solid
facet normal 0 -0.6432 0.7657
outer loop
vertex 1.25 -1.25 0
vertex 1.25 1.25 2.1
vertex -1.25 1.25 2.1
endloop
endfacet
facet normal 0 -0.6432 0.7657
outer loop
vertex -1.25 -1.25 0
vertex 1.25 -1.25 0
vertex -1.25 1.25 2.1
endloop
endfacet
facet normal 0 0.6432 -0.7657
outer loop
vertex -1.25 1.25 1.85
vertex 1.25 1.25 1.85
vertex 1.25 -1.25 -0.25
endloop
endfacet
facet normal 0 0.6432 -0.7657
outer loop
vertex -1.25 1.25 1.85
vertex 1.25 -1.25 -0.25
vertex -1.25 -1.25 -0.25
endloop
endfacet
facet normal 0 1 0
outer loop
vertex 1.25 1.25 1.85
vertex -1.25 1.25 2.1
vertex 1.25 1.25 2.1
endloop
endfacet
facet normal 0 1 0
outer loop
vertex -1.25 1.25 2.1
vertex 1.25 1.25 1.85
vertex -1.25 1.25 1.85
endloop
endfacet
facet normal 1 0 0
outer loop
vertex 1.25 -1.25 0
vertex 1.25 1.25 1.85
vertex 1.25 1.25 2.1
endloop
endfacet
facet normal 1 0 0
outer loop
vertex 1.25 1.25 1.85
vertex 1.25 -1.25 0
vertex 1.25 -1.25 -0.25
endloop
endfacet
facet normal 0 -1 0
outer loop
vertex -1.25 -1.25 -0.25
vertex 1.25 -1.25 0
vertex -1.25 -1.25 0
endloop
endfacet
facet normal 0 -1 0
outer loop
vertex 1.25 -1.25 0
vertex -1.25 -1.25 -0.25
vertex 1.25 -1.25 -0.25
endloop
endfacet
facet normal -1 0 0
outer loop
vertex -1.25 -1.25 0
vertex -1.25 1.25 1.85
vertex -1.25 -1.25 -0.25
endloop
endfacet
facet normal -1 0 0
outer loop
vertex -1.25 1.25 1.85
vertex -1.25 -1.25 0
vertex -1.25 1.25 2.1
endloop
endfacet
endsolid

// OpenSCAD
// file: lib/lodge_kit.scad
// Lodge shell tile kit — shared dimensions and modules.
//
// The game paints a lodge footprint in 5 m cells and resolves the
// exterior from these tiles at half-cell (2.5 m) resolution; see
// internal/world/lodge_shell.go. Every tile is authored in the same
// canonical frame:
//
//   * origin on the lodge floor plane (Z = 0);
//   * wall-type tiles sit on a footprint edge, centred on it, with the
//     OUTSIDE toward SCAD −Y (game +Z) and the wall thickness toward +Y;
//   * roof tiles are centred on a half-cell, with Z = 0 at the tile's
//     lowest corner; slopes fall toward −Y (game +Z);
//   * corner tiles sit on a grid vertex; an outer corner's building is
//     in the SCAD (−X, +Y) quadrant, an inner corner's notch in (+X, −Y).
//
// Colours are near-neutral: the renderer tints walls and roofs per lodge
// from a seeded palette (world.ShellPalette).
//
// Keep these in sync with the constants in lodge_shell.go.

tile   = 2.5;   // ShellTileSize
wall_h = 5.0;   // ShellWallHeight
rise   = 2.1;   // ShellRoofRise, per tile of run
pitch  = rise / tile;

wall_t   = 0.35;  // wall thickness
sink     = 1.5;   // walls run this far below the floor to hide pad grading
roof_t   = 0.25;  // roof slab thickness
overhang = 0.7;   // eaves overhang past the wall plane

c_wall   = [0.92, 0.90, 0.86];
c_stone  = [0.62, 0.61, 0.60];
c_trim   = [0.97, 0.97, 0.95];
c_glass  = [0.30, 0.42, 0.52];
c_door   = [0.36, 0.25, 0.18];
c_roof   = [0.97, 0.97, 0.97];
c_fascia = [0.55, 0.52, 0.50];

// Plain wall panel: timber above a stone plinth, a trim band under the
// eaves.
module wall_panel() {
    color(c_wall)
        translate([-tile/2, 0, -sink]) cube([tile, wall_t, wall_h + sink]);
    color(c_stone)
        translate([-tile/2, -0.06, -sink]) cube([tile, wall_t, sink + 0.7]);
    color(c_trim)
        translate([-tile/2, -0.04, wall_h - 0.3]) cube([tile, 0.1, 0.3]);
    battens();
}

// Horizontal board lines above the plinth.
module battens() {
    color(c_wall * 0.8)
        for (z = [1.3 : 0.6 : wall_h - 0.6])
            translate([-tile/2, -0.03, z]) cube([tile, 0.04, 0.06]);
}

// A framed pane on the outer face. x0/w along the wall, z0/h up it.
module pane(x0, w, z0, h) {
    color(c_trim)
        translate([x0 - 0.1, -0.05, z0 - 0.1]) cube([w + 0.2, 0.06, h + 0.2]);
    color(c_glass)
        translate([x0, -0.08, z0]) cube([w, 0.06, h]);
}

module wall_window() {
    wall_panel();
    pane(-0.7, 1.4, 1.4, 2.2);
    color(c_trim) translate([-0.02, -0.1, 1.4]) cube([0.04, 0.04, 2.2]); // mullion
}

// Tall window flanked by shutters.
module wall_window_alt() {
    wall_panel();
    pane(-0.5, 1.0, 1.2, 2.8);
    color(c_door) {
        translate([-1.0, -0.1, 1.2]) cube([0.4, 0.05, 2.8]);
        translate([ 0.6, -0.1, 1.2]) cube([0.4, 0.05, 2.8]);
    }
}

// Floor-to-eave glazing for food courts: a low stone sill, then glass in
// three lights.
module wall_glazed() {
    color(c_wall)
        translate([-tile/2, 0, -sink]) cube([tile, wall_t, wall_h + sink]);
    color(c_stone)
        translate([-tile/2, -0.06, -sink]) cube([tile, wall_t, sink + 0.35]);
    color(c_glass)
        translate([-tile/2, -0.09, 0.35]) cube([tile, 0.06, wall_h - 0.75]);
    color(c_trim) {
        for (x = [-tile/2, -tile/6, tile/6, tile/2 - 0.08])
            translate([x, -0.12, 0.35]) cube([0.08, 0.06, wall_h - 0.75]);
        translate([-tile/2, -0.12, wall_h - 0.45]) cube([tile, 0.07, 0.1]);
    }
}

// Glazed entry door under a small canopy, with a step.
module door() {
    color(c_wall)
        translate([-tile/2, 0, -sink]) cube([tile, wall_t, wall_h + sink]);
    color(c_stone)
        translate([-tile/2, -0.06, -sink]) cube([tile, wall_t, sink + 0.15]);
    battens();
    color(c_door)
        translate([-0.9, -0.1, 0]) cube([1.8, 0.1, 2.7]);
    color(c_glass) {
        translate([-0.75, -0.13, 0.9]) cube([0.65, 0.05, 1.6]);
        translate([ 0.10, -0.13, 0.9]) cube([0.65, 0.05, 1.6]);
    }
    color(c_trim)
        translate([-tile/2, -0.04, wall_h - 0.3]) cube([tile, 0.1, 0.3]);
    color(c_roof)   // canopy
        translate([-1.2, -1.3, 3.0])
            rotate([-12, 0, 0]) cube([2.4, 1.3, 0.12]);
    color(c_stone)  // step
        translate([-1.1, -0.9, -0.3]) cube([2.2, 0.9, 0.42]);
}

module corner_outer() {
    color(c_stone)
        translate([-0.3, -0.05, -sink]) cube([0.35, 0.35, wall_h + sink - 0.3]);
}

module corner_inner() {
    color(c_trim)
        translate([0, -0.12, 0]) cube([0.12, 0.12, wall_h - 0.3]);
}

// Roof slab over one half-cell. h lists corner heights (in rise units)
// in SCAD order (−X,+Y), (+X,+Y), (+X,−Y), (−X,−Y); split names which
// diagonal the top surface folds along: 0 through corners 0–2, 1
// through corners 1–3.
module roof_tile(h, split) {
    p = [[-tile/2, tile/2], [tile/2, tile/2], [tile/2, -tile/2], [-tile/2, -tile/2]];
    top = [for (i = [0:3]) [p[i][0], p[i][1], h[i] * rise]];
    bot = [for (i = [0:3]) [p[i][0], p[i][1], h[i] * rise - roof_t]];
    tris = split == 0 ? [[0, 1, 2], [0, 2, 3]] : [[0, 1, 3], [1, 2, 3]];
    color(c_roof)
        polyhedron(
            points = concat(top, bot),
            faces = concat(
                // top (clockwise seen from above = outward in OpenSCAD)
                [for (t = tris) [t[0], t[1], t[2]]],
                [for (t = tris) [t[2] + 4, t[1] + 4, t[0] + 4]],
                [for (i = [0:3]) [i, i + 4, (i + 1) % 4 + 4, (i + 1) % 4]]
            ));
}

// Eaves strip past a wall edge: continues the roof plane outward and
// down, finished with a fascia board.
module eave() {
    drop = overhang * pitch;
    color(c_roof)
        polyhedron(
            points = [
                [-tile/2, 0, 0], [tile/2, 0, 0], [tile/2, -overhang, -drop], [-tile/2, -overhang, -drop],
                [-tile/2, 0, -roof_t], [tile/2, 0, -roof_t], [tile/2, -overhang, -drop - roof_t], [-tile/2, -overhang, -drop - roof_t],
            ],
            faces = [[0, 1, 2, 3], [7, 6, 5, 4], [0, 4, 5, 1], [1, 5, 6, 2], [2, 6, 7, 3], [3, 7, 4, 0]]);
    color(c_fascia)
        translate([-tile/2, -overhang - 0.05, -drop - roof_t - 0.1]) cube([tile, 0.08, roof_t + 0.2]);
}

// Eaves in the square past an outer corner: a hip folding along the
// diagonal away from the building.
module eave_corner() {
    o = overhang;
    d = o * pitch;
    color(c_roof)
        polyhedron(
            points = [
                [0, 0, 0], [o, 0, -d], [o, -o, -d], [0, -o, -d],
                [0, 0, -roof_t], [o, 0, -d - roof_t], [o, -o, -d - roof_t], [0, -o, -d - roof_t],
            ],
            faces = [[0, 1, 2], [0, 2, 3], [6, 5, 4], [7, 6, 4], [0, 4, 5, 1], [1, 5, 6, 2], [2, 6, 7, 3], [3, 7, 4, 0]]);
    color(c_fascia) {
        translate([0, -o - 0.05, -d - roof_t - 0.1]) cube([o + 0.05, 0.08, roof_t + 0.2]);
        translate([o - 0.03, -o - 0.05, -d - roof_t - 0.1]) cube([0.08, o + 0.05, roof_t + 0.2]);
    }
}

module chimney() {
    color(c_stone)
        translate([-0.55, -0.55, -1.0]) cube([1.1, 1.1, rise + 3.0]);
    color(c_fascia)
        translate([-0.65, -0.65, rise + 1.8]) cube([1.3, 1.3, 0.2]);
}
// main file
// Lodge shell kit: roof slope, falling toward the eaves (−Y). See lib/lodge_kit.scad.
include <lib/lodge_kit.scad>
roof_tile([1, 1, 0, 0], 0);
